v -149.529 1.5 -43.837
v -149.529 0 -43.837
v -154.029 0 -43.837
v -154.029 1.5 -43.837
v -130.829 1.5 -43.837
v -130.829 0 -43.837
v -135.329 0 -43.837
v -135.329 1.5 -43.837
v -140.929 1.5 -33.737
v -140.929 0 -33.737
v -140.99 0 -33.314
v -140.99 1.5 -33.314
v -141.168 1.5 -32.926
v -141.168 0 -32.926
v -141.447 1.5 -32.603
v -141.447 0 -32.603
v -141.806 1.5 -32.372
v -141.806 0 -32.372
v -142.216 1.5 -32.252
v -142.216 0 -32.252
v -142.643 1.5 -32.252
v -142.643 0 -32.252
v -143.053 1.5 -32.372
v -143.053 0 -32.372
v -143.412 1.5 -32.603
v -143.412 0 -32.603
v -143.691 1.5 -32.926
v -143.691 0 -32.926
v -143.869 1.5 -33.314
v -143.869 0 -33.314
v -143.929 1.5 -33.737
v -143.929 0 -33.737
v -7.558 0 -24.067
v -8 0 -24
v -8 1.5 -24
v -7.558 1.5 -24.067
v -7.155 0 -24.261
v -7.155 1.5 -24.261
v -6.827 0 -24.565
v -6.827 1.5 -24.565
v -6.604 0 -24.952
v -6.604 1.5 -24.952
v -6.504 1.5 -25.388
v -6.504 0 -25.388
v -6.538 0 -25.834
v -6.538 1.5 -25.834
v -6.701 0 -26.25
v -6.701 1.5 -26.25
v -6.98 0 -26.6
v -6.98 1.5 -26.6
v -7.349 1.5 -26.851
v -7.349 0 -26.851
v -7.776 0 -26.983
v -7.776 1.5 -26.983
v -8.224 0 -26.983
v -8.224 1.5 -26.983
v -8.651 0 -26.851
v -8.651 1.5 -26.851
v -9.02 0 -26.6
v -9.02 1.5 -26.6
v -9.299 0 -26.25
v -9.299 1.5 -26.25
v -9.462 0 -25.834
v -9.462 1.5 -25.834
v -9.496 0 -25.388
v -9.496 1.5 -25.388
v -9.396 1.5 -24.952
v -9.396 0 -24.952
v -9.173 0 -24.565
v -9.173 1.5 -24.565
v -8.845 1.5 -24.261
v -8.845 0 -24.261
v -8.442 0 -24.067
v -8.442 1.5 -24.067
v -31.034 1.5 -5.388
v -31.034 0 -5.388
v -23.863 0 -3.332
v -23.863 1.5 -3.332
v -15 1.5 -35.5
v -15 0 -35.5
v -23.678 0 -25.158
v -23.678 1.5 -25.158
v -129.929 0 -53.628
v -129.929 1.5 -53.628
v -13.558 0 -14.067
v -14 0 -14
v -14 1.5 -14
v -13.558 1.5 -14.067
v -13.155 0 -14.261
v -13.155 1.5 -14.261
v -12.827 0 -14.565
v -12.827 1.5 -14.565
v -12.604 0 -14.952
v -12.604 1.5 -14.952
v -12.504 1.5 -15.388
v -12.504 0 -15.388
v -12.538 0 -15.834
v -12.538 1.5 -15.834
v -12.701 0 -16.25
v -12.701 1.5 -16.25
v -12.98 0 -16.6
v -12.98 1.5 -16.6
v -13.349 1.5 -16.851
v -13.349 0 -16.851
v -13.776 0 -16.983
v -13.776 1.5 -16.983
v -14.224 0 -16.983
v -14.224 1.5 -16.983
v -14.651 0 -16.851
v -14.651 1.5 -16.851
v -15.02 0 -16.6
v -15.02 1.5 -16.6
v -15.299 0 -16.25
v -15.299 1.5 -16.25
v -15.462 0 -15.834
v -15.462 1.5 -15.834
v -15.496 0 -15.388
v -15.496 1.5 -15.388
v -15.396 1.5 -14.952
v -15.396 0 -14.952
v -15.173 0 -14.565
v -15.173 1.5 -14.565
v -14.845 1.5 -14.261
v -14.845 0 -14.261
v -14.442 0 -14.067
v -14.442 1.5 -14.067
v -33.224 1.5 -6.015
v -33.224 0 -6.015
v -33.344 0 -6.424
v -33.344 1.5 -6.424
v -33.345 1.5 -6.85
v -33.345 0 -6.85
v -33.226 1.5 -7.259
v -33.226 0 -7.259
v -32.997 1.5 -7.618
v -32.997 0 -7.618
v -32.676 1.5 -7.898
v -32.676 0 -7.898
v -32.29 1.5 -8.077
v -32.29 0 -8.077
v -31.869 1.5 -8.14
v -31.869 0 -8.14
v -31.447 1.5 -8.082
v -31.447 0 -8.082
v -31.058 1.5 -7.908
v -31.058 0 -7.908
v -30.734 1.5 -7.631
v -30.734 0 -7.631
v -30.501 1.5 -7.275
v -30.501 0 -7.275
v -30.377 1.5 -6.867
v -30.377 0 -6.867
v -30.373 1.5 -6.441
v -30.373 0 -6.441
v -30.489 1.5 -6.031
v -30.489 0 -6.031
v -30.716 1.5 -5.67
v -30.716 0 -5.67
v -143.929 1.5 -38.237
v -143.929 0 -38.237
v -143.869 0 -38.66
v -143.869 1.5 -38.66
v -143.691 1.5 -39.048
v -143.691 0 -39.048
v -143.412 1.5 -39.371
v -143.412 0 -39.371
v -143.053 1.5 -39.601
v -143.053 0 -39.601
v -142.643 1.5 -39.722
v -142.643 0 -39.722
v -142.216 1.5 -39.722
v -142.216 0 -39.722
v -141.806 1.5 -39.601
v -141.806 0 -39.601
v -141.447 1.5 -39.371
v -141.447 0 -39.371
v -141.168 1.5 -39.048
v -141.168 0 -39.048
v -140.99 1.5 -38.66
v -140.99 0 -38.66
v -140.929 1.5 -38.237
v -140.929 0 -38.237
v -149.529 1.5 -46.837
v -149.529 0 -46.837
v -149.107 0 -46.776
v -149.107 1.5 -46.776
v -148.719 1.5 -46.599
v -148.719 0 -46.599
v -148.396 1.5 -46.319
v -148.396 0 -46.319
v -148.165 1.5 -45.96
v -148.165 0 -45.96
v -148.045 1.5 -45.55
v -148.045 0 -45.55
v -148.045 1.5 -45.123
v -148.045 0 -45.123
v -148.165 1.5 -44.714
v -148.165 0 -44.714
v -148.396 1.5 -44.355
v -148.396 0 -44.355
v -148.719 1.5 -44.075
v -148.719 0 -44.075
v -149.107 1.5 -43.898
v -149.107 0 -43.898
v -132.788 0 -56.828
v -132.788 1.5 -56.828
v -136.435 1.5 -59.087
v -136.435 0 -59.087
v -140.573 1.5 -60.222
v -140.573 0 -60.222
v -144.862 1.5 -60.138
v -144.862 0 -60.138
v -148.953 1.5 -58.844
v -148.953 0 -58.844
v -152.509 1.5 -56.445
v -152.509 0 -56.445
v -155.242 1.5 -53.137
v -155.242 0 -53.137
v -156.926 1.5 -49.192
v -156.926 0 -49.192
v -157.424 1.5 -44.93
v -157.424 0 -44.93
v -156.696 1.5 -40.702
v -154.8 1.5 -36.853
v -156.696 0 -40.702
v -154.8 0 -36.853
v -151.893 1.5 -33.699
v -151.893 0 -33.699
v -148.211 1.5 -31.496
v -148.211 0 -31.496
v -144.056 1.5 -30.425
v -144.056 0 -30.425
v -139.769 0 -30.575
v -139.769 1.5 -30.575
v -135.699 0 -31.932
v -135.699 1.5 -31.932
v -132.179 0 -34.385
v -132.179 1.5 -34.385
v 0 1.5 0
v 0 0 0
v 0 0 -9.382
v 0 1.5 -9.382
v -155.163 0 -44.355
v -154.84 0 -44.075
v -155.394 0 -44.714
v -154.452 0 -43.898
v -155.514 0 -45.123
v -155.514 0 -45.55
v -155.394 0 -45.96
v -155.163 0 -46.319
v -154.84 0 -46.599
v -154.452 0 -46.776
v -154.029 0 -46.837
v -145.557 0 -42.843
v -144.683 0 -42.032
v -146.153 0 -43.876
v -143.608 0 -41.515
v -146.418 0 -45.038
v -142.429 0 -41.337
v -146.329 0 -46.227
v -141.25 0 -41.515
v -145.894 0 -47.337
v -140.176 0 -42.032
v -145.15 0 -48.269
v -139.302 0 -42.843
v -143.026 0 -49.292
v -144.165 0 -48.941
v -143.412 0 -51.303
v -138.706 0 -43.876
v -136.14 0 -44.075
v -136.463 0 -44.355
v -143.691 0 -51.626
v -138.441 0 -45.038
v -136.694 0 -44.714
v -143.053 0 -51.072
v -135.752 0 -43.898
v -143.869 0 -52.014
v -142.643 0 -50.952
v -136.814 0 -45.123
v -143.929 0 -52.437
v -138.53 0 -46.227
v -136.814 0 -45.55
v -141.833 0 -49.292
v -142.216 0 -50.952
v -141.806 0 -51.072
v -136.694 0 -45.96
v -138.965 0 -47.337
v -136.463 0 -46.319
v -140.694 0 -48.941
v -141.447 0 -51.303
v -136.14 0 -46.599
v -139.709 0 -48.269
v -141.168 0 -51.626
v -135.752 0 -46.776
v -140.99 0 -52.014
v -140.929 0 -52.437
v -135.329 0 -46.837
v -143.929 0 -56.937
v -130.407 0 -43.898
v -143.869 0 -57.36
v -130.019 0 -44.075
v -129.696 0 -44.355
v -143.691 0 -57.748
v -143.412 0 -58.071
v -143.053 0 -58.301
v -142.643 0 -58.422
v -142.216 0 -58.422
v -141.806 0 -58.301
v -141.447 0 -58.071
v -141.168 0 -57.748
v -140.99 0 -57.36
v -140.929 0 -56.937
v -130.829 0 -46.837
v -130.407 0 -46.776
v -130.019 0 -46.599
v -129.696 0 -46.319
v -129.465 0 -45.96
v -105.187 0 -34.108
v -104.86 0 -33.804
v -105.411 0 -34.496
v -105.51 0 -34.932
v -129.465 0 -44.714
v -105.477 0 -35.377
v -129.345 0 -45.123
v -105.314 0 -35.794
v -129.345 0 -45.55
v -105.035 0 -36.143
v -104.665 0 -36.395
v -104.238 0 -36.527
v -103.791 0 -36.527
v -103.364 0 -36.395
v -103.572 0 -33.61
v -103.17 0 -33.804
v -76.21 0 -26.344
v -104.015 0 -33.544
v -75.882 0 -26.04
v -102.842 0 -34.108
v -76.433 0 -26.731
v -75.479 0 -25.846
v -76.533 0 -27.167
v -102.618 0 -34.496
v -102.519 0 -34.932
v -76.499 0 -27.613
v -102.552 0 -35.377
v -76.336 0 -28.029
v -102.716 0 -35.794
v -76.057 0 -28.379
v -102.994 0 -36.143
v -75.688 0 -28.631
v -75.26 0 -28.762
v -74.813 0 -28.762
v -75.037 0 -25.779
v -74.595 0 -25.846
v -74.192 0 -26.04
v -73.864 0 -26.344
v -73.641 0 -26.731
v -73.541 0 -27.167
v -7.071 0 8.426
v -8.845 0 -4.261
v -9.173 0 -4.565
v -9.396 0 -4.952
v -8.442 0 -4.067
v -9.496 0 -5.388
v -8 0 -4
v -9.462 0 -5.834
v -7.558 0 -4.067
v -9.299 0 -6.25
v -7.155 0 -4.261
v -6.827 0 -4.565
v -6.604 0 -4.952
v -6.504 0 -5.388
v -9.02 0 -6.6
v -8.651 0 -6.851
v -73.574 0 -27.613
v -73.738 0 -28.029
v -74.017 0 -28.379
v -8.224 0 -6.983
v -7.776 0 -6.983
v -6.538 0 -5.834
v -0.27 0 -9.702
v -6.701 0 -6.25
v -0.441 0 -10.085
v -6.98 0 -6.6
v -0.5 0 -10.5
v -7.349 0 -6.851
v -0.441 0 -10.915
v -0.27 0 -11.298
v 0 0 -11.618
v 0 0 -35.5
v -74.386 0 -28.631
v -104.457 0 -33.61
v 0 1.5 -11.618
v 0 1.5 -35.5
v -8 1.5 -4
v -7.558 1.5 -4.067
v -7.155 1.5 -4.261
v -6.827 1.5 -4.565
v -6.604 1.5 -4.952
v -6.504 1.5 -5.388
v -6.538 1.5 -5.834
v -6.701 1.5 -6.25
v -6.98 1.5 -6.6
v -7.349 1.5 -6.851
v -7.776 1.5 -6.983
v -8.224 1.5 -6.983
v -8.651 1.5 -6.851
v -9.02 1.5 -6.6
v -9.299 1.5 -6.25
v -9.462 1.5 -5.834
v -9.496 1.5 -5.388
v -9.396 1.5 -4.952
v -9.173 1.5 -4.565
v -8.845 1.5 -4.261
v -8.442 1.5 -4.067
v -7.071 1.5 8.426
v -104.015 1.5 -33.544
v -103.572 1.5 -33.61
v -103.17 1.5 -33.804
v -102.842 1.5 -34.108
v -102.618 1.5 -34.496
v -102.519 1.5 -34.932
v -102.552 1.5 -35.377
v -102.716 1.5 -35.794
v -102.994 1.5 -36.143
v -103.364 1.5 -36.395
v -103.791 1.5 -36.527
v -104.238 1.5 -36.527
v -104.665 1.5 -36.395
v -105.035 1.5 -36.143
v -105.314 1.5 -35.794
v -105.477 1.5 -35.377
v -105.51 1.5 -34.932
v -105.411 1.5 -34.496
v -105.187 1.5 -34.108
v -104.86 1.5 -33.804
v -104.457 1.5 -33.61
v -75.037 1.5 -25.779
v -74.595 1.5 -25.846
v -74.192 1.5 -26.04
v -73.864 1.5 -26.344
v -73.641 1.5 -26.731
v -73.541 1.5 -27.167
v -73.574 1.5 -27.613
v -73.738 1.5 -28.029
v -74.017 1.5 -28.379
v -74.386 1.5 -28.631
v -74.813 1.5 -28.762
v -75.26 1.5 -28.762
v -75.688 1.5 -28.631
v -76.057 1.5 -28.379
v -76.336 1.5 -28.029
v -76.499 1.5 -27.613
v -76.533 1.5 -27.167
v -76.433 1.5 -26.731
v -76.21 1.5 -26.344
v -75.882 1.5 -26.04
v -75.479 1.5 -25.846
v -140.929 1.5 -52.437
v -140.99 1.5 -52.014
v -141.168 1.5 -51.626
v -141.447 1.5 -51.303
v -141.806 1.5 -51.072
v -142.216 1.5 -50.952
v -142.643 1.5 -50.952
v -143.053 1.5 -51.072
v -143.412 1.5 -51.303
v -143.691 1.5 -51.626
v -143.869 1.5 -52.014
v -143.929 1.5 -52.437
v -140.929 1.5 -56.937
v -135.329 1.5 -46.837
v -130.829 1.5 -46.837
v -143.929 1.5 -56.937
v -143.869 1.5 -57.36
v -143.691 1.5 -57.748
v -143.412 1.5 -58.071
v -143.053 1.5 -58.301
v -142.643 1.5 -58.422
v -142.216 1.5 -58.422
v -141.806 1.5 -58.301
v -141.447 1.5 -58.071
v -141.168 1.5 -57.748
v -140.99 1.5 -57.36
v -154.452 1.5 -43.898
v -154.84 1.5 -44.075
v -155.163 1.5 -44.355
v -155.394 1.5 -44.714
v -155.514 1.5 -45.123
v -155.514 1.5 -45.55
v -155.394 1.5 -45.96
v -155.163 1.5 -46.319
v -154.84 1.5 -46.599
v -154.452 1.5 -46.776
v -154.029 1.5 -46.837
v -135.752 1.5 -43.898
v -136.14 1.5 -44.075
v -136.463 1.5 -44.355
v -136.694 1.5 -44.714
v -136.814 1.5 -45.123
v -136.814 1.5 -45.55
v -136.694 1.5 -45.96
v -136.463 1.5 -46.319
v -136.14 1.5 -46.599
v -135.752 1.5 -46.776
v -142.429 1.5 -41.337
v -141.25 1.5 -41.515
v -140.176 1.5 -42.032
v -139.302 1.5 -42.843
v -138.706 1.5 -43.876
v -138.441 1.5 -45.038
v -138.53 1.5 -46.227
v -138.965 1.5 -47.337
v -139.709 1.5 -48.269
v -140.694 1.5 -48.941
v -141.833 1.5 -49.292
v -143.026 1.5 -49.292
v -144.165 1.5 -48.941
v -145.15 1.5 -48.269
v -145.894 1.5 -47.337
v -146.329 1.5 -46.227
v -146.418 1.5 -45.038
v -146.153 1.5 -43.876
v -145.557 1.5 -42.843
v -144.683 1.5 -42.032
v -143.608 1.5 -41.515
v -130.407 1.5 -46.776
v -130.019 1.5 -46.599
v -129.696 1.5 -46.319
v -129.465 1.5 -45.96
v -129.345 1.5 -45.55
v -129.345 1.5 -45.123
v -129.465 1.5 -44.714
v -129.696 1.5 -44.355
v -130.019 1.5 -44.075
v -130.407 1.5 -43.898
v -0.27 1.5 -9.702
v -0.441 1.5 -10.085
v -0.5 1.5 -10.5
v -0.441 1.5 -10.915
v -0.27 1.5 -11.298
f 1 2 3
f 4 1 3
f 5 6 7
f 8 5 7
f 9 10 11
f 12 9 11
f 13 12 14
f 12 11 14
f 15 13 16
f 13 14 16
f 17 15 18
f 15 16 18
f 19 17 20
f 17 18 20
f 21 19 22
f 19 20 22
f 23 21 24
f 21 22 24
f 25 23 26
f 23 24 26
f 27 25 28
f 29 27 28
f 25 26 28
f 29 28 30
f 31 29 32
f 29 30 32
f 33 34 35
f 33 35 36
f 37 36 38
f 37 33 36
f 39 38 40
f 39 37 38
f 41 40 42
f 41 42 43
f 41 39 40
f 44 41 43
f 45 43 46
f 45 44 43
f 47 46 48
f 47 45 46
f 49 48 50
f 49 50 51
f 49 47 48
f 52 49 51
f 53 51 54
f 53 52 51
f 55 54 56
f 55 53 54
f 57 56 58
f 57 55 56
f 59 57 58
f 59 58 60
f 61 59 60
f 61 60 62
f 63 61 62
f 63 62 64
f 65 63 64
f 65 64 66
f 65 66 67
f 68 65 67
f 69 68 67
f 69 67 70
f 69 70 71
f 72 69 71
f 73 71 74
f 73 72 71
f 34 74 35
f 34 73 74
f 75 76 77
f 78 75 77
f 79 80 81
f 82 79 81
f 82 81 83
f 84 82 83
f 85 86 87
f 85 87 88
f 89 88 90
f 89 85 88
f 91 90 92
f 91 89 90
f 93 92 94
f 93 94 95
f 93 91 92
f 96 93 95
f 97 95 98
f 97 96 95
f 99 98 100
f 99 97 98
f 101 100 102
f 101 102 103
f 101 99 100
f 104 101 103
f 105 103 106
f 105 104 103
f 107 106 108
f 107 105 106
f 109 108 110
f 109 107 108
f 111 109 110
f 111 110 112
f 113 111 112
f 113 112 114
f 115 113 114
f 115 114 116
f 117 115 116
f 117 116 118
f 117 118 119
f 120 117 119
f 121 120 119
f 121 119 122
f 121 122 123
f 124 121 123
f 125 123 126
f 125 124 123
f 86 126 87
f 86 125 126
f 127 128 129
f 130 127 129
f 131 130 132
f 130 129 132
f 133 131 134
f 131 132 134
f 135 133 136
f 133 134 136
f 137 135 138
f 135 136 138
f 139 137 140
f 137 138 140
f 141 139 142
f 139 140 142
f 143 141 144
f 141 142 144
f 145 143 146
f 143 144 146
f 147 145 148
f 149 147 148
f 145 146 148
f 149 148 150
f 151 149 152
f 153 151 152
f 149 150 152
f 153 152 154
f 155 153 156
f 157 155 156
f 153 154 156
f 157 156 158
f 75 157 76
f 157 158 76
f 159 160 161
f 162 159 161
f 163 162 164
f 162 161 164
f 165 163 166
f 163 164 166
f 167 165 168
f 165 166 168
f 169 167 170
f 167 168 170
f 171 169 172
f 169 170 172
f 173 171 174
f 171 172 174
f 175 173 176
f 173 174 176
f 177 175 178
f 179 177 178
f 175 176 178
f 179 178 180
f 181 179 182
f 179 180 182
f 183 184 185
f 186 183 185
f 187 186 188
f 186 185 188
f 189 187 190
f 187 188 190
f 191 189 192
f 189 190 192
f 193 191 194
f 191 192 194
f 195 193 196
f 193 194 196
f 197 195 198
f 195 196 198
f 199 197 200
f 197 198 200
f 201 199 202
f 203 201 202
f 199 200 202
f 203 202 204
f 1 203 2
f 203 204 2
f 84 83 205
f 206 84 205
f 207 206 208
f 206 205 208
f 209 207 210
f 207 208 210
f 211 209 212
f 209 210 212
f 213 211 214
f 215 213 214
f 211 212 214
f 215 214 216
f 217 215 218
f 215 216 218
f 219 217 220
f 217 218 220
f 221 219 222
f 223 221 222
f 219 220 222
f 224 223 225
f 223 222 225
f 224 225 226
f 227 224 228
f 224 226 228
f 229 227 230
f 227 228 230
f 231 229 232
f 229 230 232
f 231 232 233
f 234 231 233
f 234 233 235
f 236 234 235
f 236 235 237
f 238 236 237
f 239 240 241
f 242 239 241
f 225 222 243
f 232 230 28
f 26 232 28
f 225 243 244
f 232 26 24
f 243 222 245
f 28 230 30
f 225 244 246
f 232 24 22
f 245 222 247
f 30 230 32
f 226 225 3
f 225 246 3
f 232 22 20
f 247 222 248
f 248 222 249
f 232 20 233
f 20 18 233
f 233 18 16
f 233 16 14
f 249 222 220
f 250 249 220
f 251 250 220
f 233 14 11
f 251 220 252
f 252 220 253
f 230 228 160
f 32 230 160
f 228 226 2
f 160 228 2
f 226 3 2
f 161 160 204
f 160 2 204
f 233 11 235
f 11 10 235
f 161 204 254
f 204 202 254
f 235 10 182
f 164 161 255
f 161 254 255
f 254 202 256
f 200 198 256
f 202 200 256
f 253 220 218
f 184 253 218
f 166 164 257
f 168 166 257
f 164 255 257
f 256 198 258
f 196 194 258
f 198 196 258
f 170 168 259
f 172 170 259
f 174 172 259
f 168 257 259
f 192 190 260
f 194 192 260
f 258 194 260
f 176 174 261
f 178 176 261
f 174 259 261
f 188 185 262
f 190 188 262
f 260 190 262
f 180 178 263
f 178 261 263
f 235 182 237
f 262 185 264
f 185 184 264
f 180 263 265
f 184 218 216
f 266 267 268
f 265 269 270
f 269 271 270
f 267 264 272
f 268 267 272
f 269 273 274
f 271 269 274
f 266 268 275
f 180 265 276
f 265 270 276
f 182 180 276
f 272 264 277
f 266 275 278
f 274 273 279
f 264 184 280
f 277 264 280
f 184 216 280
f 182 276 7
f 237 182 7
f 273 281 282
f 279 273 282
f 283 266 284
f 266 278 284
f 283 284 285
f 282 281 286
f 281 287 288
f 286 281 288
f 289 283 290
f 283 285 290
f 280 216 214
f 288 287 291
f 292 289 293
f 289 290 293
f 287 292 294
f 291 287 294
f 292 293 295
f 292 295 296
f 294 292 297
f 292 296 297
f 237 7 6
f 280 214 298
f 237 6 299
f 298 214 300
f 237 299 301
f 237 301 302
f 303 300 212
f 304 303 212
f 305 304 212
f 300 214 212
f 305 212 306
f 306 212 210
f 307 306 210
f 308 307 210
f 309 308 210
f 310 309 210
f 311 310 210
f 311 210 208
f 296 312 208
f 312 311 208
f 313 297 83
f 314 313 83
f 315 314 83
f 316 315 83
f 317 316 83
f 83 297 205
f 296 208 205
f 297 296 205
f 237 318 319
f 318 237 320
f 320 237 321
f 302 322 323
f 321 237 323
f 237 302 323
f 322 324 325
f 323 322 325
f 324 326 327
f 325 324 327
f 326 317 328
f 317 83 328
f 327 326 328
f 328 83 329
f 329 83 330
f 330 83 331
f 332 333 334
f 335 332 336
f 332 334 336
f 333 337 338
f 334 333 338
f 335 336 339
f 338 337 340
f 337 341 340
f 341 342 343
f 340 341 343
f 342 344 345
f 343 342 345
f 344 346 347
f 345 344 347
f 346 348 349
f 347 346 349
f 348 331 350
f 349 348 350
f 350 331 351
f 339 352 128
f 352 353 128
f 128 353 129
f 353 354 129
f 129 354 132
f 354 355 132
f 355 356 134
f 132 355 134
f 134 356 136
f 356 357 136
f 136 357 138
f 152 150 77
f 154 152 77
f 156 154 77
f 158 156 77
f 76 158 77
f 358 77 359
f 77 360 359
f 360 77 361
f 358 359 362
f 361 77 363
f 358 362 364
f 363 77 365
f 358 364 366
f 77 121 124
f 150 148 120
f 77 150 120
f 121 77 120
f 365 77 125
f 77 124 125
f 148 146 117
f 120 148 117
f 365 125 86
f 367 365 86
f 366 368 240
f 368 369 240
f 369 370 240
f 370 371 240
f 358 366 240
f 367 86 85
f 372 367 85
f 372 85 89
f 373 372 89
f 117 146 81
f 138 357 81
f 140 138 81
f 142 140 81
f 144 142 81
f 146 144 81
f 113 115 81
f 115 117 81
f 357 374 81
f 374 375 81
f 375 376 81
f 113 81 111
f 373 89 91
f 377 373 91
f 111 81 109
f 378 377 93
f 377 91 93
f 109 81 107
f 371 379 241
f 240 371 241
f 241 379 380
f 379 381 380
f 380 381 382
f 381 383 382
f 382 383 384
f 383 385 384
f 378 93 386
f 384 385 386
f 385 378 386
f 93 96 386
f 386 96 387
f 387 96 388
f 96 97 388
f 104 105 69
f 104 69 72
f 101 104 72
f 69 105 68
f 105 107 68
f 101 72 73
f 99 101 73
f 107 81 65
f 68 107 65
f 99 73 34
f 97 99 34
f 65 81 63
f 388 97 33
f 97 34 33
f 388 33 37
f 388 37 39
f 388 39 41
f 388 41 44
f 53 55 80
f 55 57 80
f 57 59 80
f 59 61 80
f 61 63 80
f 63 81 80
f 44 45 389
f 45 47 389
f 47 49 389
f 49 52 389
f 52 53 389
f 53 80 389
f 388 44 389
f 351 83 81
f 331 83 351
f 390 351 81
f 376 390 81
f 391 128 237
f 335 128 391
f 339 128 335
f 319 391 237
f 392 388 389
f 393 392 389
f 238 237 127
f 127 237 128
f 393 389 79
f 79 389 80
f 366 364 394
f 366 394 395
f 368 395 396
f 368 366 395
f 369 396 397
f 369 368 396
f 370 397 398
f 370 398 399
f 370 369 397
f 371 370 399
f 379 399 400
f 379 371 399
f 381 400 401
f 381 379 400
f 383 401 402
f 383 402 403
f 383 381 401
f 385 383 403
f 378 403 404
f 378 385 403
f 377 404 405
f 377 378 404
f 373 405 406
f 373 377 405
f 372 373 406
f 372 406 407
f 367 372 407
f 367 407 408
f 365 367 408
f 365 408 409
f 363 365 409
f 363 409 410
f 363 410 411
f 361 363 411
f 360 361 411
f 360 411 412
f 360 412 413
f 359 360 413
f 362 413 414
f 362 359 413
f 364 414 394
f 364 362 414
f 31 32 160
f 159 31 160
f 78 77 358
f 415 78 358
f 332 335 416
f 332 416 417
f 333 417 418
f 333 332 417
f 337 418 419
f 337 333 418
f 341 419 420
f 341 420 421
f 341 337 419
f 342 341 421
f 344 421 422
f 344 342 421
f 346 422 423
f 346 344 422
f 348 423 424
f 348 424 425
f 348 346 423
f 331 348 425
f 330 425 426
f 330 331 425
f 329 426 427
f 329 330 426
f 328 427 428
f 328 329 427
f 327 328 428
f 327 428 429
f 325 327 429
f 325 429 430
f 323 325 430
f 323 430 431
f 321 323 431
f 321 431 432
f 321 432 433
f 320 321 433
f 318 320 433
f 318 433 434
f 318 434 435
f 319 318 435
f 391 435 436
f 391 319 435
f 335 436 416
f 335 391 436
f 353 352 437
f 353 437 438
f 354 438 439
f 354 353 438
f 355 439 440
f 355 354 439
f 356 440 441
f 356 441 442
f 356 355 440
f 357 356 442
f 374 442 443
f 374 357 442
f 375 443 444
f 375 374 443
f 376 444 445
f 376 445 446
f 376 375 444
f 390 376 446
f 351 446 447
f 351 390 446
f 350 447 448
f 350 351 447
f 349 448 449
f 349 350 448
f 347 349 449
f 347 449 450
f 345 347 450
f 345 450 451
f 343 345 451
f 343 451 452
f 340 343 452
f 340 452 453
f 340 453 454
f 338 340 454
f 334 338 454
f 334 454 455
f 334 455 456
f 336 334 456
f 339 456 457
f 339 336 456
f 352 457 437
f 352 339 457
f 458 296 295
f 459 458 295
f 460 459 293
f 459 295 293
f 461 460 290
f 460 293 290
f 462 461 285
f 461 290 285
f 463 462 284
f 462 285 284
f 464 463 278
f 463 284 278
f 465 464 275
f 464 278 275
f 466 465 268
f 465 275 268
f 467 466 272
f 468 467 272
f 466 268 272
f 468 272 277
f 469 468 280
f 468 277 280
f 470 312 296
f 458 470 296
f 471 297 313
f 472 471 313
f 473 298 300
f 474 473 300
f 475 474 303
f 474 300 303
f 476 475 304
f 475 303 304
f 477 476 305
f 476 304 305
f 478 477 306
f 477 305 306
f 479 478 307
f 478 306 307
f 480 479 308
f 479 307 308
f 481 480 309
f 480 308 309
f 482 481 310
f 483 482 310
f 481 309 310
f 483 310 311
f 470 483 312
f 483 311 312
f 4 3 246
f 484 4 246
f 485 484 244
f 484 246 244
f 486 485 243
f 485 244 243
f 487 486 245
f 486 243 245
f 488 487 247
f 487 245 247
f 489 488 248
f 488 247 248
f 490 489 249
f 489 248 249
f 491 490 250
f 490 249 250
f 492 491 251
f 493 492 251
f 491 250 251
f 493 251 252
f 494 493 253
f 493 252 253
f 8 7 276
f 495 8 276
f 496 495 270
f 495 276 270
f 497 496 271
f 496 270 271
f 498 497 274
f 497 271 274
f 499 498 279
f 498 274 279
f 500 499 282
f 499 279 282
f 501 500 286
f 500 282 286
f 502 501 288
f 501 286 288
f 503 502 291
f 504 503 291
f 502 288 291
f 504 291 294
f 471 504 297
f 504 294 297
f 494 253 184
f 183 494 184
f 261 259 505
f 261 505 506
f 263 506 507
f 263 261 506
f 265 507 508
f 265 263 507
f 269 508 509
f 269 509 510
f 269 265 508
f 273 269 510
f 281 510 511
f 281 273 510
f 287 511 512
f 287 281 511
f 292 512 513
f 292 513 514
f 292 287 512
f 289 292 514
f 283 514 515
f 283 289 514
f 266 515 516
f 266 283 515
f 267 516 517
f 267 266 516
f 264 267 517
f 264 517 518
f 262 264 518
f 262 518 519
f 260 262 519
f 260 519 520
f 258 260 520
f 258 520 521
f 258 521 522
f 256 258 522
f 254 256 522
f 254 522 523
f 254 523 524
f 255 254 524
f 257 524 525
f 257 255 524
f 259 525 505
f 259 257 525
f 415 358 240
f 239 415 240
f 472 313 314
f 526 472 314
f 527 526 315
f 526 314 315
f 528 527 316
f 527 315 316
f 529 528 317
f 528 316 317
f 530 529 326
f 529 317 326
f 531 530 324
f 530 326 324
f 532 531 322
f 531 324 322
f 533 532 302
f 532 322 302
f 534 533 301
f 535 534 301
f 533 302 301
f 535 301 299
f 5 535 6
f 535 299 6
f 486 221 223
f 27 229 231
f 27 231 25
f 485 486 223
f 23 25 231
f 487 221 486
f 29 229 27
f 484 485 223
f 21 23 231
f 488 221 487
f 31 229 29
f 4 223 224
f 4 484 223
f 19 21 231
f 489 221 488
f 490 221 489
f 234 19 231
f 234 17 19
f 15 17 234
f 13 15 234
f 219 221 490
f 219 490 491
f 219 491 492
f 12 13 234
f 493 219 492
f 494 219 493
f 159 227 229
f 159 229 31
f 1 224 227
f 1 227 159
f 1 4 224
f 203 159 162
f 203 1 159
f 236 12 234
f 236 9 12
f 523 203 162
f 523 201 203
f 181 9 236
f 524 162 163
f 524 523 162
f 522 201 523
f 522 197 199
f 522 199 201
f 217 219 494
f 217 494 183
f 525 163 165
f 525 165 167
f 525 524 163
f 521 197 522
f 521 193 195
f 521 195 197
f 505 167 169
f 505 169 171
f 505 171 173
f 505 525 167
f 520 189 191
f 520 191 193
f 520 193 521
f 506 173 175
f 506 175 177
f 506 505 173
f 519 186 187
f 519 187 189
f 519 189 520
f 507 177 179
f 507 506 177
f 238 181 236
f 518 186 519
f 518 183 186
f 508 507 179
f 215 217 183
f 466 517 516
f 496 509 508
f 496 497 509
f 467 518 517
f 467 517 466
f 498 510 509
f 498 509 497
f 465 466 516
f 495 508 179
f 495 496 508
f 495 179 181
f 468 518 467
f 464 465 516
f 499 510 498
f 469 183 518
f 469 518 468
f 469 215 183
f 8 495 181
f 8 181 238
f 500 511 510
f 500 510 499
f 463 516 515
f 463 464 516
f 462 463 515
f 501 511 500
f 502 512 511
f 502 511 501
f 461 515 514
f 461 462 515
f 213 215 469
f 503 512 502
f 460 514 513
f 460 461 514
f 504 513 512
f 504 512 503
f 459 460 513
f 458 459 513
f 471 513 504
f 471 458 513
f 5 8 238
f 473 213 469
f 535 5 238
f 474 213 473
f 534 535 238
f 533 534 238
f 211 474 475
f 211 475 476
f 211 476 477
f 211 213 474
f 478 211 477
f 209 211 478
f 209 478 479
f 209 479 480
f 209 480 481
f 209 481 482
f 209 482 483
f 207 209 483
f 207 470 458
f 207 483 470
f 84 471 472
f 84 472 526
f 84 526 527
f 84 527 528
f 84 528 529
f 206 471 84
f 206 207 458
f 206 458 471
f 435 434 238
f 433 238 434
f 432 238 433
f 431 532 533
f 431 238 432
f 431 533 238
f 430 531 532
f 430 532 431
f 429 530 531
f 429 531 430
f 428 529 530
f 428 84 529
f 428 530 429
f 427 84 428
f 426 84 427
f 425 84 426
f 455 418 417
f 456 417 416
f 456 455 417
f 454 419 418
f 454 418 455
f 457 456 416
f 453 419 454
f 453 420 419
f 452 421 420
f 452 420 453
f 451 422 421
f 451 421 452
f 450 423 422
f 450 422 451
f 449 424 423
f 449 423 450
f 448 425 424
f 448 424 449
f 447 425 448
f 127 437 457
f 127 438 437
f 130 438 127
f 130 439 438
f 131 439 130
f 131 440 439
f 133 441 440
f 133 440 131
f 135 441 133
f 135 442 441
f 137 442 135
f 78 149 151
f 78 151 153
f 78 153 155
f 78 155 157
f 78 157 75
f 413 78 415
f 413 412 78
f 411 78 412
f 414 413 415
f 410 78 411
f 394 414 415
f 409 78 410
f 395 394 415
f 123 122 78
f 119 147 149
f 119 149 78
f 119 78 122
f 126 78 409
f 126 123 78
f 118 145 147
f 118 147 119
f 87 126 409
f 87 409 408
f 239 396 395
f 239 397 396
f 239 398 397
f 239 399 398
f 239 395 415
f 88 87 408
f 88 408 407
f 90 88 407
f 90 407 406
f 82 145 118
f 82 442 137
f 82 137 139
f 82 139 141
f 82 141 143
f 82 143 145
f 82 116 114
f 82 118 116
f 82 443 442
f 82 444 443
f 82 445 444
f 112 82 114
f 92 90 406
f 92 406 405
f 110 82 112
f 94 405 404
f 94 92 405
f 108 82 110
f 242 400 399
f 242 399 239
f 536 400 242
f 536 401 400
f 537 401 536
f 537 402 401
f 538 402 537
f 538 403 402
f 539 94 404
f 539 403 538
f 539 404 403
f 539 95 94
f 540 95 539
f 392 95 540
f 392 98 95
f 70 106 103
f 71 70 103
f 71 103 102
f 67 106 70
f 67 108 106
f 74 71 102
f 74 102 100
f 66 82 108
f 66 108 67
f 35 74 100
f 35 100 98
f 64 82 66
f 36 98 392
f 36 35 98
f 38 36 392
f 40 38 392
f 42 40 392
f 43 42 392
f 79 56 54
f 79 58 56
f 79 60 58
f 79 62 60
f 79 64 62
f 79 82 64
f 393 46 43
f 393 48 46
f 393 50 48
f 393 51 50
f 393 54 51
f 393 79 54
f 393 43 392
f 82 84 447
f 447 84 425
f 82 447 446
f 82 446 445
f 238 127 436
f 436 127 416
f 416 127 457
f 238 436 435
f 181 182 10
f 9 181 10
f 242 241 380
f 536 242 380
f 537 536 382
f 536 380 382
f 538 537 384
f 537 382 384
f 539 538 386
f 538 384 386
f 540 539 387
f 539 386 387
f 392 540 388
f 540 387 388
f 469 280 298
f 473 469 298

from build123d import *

# Parameters (mm, degrees)
SKETCH1_R           = 1.5
SKETCH1_R_2         = 4
BOSS_EXTRUDE1_DEPTH = 1.5


with BuildPart() as part:
    # Sketch1 → Boss-Extrude1 (new body)
    with BuildSketch(Plane(origin=(0, 0, 0), x_dir=(1, 0, 0), z_dir=(0, 1, 0))):
        with BuildLine():
            Line((-7.070663707, -8.426488874), (0, 0))
            Line((0, 0), (0, 9.381966011))
            ThreePointArc((0, 9.381966011), (-0.5, 10.5), (0, 11.618033989))
            Line((0, 11.618033989), (0, 35.5))
            Line((0, 35.5), (-15, 35.5))
            Line((-15, 35.5), (-23.677632731, 25.158400018))
            Line((-23.677632731, 25.158400018), (-129.929473623, 53.628494979))
            ThreePointArc((-129.929473623, 53.628494979), (-157.327989791, 47.078833109), (-132.17932297, 34.38547595))
            Line((-132.17932297, 34.38547595), (-33.223789423, 6.015437425))
            ThreePointArc((-33.223789423, 6.015437425), (-31.446611343, 8.081911862), (-31.03429168, 5.387719772))
            Line((-31.03429168, 5.387719772), (-23.863280614, 3.331828071))
            Line((-23.863280614, 3.331828071), (-7.070663707, -8.426488874))
        make_face()
        with Locations(Location((-8, 5.5, 0), (0, 0, 270))):
            Circle(SKETCH1_R, mode=Mode.SUBTRACT)
        with Locations(Location((-14, 15.5, 0), (0, 0, 270))):
            Circle(SKETCH1_R, mode=Mode.SUBTRACT)
        with Locations(Location((-8, 25.5, 0), (0, 0, 270))):
            Circle(SKETCH1_R, mode=Mode.SUBTRACT)
        with BuildLine():
            ThreePointArc((-143.929473623, 38.236933003), (-142.429473623, 39.736933003), (-140.929473623, 38.236933003))
            Line((-140.929473623, 38.236933003), (-140.929473623, 33.736933003))
            ThreePointArc((-140.929473623, 33.736933003), (-142.429473623, 32.236933003), (-143.929473623, 33.736933003))
            Line((-143.929473623, 33.736933003), (-143.929473623, 38.236933003))
        make_face(mode=Mode.SUBTRACT)
        with Locations(Location((-104.014603511, 35.04369958, 0), (0, 0, 270))):
            Circle(SKETCH1_R, mode=Mode.SUBTRACT)
        with BuildLine():
            ThreePointArc((-149.529473623, 46.836933003), (-148.029473623, 45.336933003), (-149.529473623, 43.836933003))
            Line((-149.529473623, 43.836933003), (-154.029473623, 43.836933003))
            ThreePointArc((-154.029473623, 43.836933003), (-155.529473623, 45.336933003), (-154.029473623, 46.836933003))
            Line((-154.029473623, 46.836933003), (-149.529473623, 46.836933003))
        make_face(mode=Mode.SUBTRACT)
        with Locations(Location((-142.429473623, 45.336933003, 0), (0, 0, 270))):
            Circle(SKETCH1_R_2, mode=Mode.SUBTRACT)
        with BuildLine():
            ThreePointArc((-135.329473623, 43.836933003), (-136.829473623, 45.336933003), (-135.329473623, 46.836933003))
            Line((-135.329473623, 46.836933003), (-130.829473623, 46.836933003))
            ThreePointArc((-130.829473623, 46.836933003), (-129.329473623, 45.336933003), (-130.829473623, 43.836933003))
            Line((-130.829473623, 43.836933003), (-135.329473623, 43.836933003))
        make_face(mode=Mode.SUBTRACT)
        with BuildLine():
            ThreePointArc((-140.929473623, 52.436933003), (-142.429473623, 50.936933003), (-143.929473623, 52.436933003))
            Line((-143.929473623, 52.436933003), (-143.929473623, 56.936933003))
            ThreePointArc((-143.929473623, 56.936933003), (-142.429473623, 58.436933003), (-140.929473623, 56.936933003))
            Line((-140.929473623, 56.936933003), (-140.929473623, 52.436933003))
        make_face(mode=Mode.SUBTRACT)
        with Locations(Location((-75.036828722, 27.279128226, 0), (0, 0, 270))):
            Circle(SKETCH1_R, mode=Mode.SUBTRACT)
    extrude(amount=BOSS_EXTRUDE1_DEPTH)


solid = part.part
